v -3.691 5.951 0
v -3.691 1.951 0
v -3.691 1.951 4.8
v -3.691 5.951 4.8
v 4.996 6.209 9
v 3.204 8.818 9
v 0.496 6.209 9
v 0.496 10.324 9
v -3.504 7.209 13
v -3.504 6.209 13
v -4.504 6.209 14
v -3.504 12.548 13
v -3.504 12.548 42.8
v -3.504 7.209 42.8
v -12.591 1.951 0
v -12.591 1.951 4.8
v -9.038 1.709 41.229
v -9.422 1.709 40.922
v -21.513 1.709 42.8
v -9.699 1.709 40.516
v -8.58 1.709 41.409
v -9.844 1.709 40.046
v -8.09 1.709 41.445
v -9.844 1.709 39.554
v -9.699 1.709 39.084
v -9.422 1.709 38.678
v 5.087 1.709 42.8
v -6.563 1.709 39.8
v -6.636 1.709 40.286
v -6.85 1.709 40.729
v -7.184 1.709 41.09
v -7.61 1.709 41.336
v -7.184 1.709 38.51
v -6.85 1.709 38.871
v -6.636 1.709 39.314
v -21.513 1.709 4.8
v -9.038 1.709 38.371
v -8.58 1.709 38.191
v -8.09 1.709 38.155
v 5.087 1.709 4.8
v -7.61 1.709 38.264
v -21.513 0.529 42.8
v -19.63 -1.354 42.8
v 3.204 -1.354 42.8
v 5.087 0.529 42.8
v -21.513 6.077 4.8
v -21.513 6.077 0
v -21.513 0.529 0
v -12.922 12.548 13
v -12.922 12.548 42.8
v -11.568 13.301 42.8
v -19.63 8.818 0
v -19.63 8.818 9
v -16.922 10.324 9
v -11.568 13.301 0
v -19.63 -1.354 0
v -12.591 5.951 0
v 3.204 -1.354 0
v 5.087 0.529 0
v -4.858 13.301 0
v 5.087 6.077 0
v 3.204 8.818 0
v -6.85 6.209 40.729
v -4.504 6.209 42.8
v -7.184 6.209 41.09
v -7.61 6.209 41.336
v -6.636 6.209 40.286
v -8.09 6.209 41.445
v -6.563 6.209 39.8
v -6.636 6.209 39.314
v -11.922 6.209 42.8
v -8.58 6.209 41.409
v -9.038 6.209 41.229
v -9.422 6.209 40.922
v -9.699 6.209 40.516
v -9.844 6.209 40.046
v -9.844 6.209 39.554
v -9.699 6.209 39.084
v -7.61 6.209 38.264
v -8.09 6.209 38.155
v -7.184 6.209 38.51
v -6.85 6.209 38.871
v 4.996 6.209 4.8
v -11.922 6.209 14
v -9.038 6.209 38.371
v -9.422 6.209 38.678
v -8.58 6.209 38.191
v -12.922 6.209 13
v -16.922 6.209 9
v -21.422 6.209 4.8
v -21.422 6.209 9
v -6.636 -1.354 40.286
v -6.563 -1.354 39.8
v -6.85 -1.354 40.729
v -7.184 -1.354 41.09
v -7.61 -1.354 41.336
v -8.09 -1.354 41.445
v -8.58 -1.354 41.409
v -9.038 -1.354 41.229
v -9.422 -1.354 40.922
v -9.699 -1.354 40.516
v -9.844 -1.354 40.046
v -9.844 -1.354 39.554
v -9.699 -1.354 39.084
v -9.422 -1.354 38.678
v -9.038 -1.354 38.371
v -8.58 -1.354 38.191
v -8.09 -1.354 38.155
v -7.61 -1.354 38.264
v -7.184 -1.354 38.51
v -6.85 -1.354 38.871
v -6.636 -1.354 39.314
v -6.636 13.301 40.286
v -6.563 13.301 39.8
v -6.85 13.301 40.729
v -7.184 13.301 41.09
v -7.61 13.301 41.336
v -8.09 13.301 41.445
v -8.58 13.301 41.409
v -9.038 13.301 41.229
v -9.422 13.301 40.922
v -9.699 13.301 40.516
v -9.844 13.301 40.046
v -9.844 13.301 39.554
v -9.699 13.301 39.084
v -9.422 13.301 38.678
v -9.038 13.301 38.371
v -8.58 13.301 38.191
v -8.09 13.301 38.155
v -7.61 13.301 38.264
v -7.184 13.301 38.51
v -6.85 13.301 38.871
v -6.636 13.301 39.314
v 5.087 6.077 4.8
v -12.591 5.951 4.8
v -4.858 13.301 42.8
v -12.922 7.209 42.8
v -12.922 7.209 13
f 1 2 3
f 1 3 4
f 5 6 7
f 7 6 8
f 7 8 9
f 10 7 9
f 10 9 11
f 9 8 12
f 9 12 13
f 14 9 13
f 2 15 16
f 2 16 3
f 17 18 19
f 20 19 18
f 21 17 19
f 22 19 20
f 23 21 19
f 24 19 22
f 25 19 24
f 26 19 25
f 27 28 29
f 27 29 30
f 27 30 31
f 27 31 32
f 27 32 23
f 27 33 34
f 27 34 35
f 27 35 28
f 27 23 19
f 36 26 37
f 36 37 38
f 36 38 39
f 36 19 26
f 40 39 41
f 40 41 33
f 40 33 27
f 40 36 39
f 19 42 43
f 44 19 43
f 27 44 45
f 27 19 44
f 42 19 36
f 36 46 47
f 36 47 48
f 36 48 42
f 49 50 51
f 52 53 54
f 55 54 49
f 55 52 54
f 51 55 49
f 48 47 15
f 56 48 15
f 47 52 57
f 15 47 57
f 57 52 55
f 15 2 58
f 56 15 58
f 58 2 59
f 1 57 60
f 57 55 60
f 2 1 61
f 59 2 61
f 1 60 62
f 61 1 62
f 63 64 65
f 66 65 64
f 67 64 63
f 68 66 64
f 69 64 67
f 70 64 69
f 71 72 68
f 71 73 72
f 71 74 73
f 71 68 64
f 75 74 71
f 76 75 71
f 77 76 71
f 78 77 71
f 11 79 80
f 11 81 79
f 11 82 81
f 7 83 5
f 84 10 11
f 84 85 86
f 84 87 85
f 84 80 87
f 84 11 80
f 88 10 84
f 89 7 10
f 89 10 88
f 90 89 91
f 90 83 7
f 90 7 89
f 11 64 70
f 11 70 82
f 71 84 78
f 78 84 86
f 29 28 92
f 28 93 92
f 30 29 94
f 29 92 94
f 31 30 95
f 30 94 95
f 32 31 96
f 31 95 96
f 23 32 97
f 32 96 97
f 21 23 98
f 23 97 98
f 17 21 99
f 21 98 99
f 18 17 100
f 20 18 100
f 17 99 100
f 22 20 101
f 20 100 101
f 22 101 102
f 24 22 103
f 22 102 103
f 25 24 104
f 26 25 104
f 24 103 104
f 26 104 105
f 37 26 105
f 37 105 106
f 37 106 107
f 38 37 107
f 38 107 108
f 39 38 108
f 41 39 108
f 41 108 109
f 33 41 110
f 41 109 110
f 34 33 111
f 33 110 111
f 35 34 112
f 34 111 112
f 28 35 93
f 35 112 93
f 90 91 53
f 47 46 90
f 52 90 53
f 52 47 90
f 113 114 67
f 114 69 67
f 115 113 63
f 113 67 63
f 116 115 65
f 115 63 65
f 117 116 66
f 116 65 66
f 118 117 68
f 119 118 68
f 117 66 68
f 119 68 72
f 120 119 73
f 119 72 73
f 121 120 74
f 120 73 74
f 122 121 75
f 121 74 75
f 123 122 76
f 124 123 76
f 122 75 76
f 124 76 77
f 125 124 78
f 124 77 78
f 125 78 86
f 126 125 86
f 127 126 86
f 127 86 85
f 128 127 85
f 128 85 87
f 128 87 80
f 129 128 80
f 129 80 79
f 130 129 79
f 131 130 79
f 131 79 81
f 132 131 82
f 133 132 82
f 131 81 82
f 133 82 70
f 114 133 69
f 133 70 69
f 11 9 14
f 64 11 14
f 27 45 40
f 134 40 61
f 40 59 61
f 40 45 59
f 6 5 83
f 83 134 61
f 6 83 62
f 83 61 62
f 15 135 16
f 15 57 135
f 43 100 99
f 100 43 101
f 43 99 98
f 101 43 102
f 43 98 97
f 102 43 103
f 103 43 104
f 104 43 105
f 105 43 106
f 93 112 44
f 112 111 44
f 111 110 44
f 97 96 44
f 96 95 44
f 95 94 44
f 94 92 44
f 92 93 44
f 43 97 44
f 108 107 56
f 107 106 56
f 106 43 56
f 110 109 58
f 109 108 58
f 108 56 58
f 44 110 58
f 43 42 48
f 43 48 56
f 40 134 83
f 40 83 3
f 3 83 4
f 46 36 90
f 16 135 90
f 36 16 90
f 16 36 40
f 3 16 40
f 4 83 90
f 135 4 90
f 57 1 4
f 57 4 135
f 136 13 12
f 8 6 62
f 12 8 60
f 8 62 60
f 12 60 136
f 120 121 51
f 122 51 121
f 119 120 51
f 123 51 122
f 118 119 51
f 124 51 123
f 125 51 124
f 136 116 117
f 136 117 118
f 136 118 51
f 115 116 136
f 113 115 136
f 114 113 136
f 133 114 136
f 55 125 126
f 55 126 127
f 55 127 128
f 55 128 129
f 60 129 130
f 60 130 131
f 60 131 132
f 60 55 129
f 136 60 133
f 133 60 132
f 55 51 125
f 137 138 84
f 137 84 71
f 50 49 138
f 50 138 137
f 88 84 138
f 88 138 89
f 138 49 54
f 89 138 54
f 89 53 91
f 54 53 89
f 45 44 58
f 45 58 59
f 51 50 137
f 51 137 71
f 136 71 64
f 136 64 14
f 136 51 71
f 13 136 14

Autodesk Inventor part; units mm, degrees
ref_plane "YZ Plane" through (0, 0, 0) normal (1, 0, 0) x (0, 1, 0)
ref_plane "XZ Plane" through (0, 0, 0) normal (0, 1, 0) x (-1, 0, 0)
ref_plane "XY Plane" through (0, 0, 0) normal (0, 0, 1) x (1, 0, 0)
sketch "Sketch1" plane through (0, 0, 0) normal (0, 0, 1) x (1, 0, 0)
  line L0 (-23.7129, 7.994) -> (-21.7129, 5.994)
  line L1 (-21.7129, 0.4463) -> (-21.7129, 5.994)
  line L2 (-19.7129, -1.5537) -> (-21.7129, 0.4463)
  line L3 (3.2871, -1.5537) -> (-19.7129, -1.5537)
  line L4 (5.2871, 0.4463) -> (3.2871, -1.5537)
  line L5 (5.2871, 5.994) -> (5.2871, 0.4463)
  line L6 (5.2871, 5.994) -> (7.2871, 7.994)
  line L7 (-23.5715, 8.1354) -> (-21.5129, 6.0768)
  line L8 (-21.5129, 6.0768) -> (-21.5129, 0.5292)
  line L9 (-21.5129, 0.5292) -> (-19.6301, -1.3537)
  line L10 (-19.6301, -1.3537) -> (3.2042, -1.3537)
  line L11 (3.2042, -1.3537) -> (5.0871, 0.5292)
  line L12 (5.0871, 0.5292) -> (5.0871, 6.0768)
  line L13 (5.0871, 6.0768) -> (7.1456, 8.1354)
  line L14 (-21.5129, 6.0768) -> (-19.6301, 8.8175)
  line L15 (-19.6301, 8.8175) -> (-11.568, 13.3014)
  line L16 (-11.568, 13.3014) -> (-8.2129, 13.3014)
  line L17 (-19.7129, -1.5537) -> (-19.7129, -4.3475)
  line L18 (-19.7129, -4.3475) -> (-8.2129, -4.3475)
  line L19 (-8.2129, -4.3475) -> (-8.2129, 15.1673)
  line L20 (5.0871, 6.0768) -> (3.2042, 8.8175)
  line L21 (3.2042, 8.8175) -> (-4.8579, 13.3014)
  line L22 (-4.8579, 13.3014) -> (-8.2129, 13.3014)
  point P0 (0, 0)
  dimension "d0" = 0.2
  dimension "d1" = 23
  dimension "d2" = 11.5
extrude "Extrusion1" add sketch "Sketch1" along normal blind 42.8 contours L10 L9 L8 L14 L15 L16 L19 | L19 L22 L21 L20 L12 L11 L10
sketch "Sketch2" plane through (0, 0, 0) normal (0, 0, -1) x (-1, 0, 0)
  line L0 (13.2269, 1.874) -> (13.2269, 5.874) projected
  line L1 (3.0769, 5.874) -> (13.2269, 5.874) projected
  line L2 (3.0769, 5.874) -> (3.0769, 1.874) projected
  line L3 (3.6906, 5.9511) -> (12.5906, 5.9511)
  line L4 (12.5906, 5.9511) -> (12.5906, 1.9511)
  line L5 (12.5906, 1.9511) -> (3.6906, 1.9511)
  line L6 (3.6906, 1.9511) -> (3.6906, 5.9511)
  point P0 (0, 0)
  dimension "d5" = 4
  dimension "d6" = 8.9
extrude "Extrusion2" cut sketch "Sketch2" against normal blind 4.8
sketch "Sketch3" plane through (0, 0, 4.8) normal (0, 0, -1) x (-1, 0, 0)
  line L0 (-8.749, 6.2089) -> (25.106, 6.2089)
  line L1 (25.106, 6.2089) -> (25.106, 1.7089)
  line L2 (25.106, 1.7089) -> (-8.749, 1.7089)
  line L3 (-8.749, 1.7089) -> (-8.749, 6.2089)
  point P0 (0, 0)
  dimension "d9" = 4.5
extrude "Extrusion3" cut sketch "Sketch3" against normal through all
sketch "Sketch4" plane through (-19.6301, -1.3537, 0) normal (0, -1, 0) x (1, 0, 0)
  line L0 (0, 0) -> (0, 42.8) projected
  line L1 (0, 39.8) -> (11.4172, 39.8)
  line L2 (11.4172, 39.8) -> (22.8343, 39.8)
  line L3 (22.8343, 0) -> (22.8343, 42.8) projected
  circle A0 centre (11.4172, 39.8) radius 1.65
  line L4 (0, 42.8) -> (22.8343, 42.8) projected
  point P0 (19.6301, 0)
  dimension "d12" = 3
  dimension "d13" = 3.3
extrude "Extrusion4" cut sketch "Sketch4" against normal through all contours A0 L2 L1 | L1 L2 A0
sketch "Sketch5" plane through (-11.568, 13.3014, 0) normal (0, 1, 0) x (1, 0, 0)
  line L0 (7.8774, 0) -> (7.8774, -4.8) projected
  line L1 (-1.0226, 0) -> (-1.0226, -4.8) projected
  line L2 (-1.3542, -46.1873) -> (-11.7813, -46.1873)
  line L3 (-11.7813, -46.1873) -> (-11.7813, -9)
  line L4 (-11.7813, -9) -> (-5.3542, -9)
  line L5 (-1.3542, -13) -> (-1.3542, -46.1873)
  line L6 (8.0643, -44.7269) -> (19.9839, -44.7269)
  line L7 (19.9839, -44.7269) -> (19.9839, -9)
  line L8 (19.9839, -9) -> (12.0643, -9)
  line L9 (8.0643, -13) -> (8.0643, -44.7269)
  line L10 (16.5643, -42.8) -> (16.5643, -4.8) projected
  line L11 (-9.8542, -4.8) -> (-9.8542, -42.8) projected
  line L12 (14.7722, 0) -> (6.7101, 0) projected
  line L13 (12.0643, -9) -> (8.0643, -13)
  line L14 (-1.3542, -13) -> (-5.3542, -9)
  point P0 (11.568, 0)
  point P1 (-1.3542, -9)
  point P2 (8.0643, -9)
  dimension "d16" = 8.5
  dimension "d17" = 8.5
  dimension "d18" = 9
  dimension "d19" = 4
  dimension "d20" = 4
  dimension "d21" = 4
  dimension "d22" = 4
extrude "Extrusion5" cut sketch "Sketch5" against normal up to surface (11.5925 mm away)
chamfer "Chamfer1" distance 1 angle 45 2 edges at (-3.5036, 6.2089, 27.9) (-12.9222, 6.2089, 27.9)
equation "\"d17\" = d16"
equation "\"d20\" = d19"
equation "\"d21\" = d19"
equation "\"d22\" = d21"
properties part number "charge_port_plug"
